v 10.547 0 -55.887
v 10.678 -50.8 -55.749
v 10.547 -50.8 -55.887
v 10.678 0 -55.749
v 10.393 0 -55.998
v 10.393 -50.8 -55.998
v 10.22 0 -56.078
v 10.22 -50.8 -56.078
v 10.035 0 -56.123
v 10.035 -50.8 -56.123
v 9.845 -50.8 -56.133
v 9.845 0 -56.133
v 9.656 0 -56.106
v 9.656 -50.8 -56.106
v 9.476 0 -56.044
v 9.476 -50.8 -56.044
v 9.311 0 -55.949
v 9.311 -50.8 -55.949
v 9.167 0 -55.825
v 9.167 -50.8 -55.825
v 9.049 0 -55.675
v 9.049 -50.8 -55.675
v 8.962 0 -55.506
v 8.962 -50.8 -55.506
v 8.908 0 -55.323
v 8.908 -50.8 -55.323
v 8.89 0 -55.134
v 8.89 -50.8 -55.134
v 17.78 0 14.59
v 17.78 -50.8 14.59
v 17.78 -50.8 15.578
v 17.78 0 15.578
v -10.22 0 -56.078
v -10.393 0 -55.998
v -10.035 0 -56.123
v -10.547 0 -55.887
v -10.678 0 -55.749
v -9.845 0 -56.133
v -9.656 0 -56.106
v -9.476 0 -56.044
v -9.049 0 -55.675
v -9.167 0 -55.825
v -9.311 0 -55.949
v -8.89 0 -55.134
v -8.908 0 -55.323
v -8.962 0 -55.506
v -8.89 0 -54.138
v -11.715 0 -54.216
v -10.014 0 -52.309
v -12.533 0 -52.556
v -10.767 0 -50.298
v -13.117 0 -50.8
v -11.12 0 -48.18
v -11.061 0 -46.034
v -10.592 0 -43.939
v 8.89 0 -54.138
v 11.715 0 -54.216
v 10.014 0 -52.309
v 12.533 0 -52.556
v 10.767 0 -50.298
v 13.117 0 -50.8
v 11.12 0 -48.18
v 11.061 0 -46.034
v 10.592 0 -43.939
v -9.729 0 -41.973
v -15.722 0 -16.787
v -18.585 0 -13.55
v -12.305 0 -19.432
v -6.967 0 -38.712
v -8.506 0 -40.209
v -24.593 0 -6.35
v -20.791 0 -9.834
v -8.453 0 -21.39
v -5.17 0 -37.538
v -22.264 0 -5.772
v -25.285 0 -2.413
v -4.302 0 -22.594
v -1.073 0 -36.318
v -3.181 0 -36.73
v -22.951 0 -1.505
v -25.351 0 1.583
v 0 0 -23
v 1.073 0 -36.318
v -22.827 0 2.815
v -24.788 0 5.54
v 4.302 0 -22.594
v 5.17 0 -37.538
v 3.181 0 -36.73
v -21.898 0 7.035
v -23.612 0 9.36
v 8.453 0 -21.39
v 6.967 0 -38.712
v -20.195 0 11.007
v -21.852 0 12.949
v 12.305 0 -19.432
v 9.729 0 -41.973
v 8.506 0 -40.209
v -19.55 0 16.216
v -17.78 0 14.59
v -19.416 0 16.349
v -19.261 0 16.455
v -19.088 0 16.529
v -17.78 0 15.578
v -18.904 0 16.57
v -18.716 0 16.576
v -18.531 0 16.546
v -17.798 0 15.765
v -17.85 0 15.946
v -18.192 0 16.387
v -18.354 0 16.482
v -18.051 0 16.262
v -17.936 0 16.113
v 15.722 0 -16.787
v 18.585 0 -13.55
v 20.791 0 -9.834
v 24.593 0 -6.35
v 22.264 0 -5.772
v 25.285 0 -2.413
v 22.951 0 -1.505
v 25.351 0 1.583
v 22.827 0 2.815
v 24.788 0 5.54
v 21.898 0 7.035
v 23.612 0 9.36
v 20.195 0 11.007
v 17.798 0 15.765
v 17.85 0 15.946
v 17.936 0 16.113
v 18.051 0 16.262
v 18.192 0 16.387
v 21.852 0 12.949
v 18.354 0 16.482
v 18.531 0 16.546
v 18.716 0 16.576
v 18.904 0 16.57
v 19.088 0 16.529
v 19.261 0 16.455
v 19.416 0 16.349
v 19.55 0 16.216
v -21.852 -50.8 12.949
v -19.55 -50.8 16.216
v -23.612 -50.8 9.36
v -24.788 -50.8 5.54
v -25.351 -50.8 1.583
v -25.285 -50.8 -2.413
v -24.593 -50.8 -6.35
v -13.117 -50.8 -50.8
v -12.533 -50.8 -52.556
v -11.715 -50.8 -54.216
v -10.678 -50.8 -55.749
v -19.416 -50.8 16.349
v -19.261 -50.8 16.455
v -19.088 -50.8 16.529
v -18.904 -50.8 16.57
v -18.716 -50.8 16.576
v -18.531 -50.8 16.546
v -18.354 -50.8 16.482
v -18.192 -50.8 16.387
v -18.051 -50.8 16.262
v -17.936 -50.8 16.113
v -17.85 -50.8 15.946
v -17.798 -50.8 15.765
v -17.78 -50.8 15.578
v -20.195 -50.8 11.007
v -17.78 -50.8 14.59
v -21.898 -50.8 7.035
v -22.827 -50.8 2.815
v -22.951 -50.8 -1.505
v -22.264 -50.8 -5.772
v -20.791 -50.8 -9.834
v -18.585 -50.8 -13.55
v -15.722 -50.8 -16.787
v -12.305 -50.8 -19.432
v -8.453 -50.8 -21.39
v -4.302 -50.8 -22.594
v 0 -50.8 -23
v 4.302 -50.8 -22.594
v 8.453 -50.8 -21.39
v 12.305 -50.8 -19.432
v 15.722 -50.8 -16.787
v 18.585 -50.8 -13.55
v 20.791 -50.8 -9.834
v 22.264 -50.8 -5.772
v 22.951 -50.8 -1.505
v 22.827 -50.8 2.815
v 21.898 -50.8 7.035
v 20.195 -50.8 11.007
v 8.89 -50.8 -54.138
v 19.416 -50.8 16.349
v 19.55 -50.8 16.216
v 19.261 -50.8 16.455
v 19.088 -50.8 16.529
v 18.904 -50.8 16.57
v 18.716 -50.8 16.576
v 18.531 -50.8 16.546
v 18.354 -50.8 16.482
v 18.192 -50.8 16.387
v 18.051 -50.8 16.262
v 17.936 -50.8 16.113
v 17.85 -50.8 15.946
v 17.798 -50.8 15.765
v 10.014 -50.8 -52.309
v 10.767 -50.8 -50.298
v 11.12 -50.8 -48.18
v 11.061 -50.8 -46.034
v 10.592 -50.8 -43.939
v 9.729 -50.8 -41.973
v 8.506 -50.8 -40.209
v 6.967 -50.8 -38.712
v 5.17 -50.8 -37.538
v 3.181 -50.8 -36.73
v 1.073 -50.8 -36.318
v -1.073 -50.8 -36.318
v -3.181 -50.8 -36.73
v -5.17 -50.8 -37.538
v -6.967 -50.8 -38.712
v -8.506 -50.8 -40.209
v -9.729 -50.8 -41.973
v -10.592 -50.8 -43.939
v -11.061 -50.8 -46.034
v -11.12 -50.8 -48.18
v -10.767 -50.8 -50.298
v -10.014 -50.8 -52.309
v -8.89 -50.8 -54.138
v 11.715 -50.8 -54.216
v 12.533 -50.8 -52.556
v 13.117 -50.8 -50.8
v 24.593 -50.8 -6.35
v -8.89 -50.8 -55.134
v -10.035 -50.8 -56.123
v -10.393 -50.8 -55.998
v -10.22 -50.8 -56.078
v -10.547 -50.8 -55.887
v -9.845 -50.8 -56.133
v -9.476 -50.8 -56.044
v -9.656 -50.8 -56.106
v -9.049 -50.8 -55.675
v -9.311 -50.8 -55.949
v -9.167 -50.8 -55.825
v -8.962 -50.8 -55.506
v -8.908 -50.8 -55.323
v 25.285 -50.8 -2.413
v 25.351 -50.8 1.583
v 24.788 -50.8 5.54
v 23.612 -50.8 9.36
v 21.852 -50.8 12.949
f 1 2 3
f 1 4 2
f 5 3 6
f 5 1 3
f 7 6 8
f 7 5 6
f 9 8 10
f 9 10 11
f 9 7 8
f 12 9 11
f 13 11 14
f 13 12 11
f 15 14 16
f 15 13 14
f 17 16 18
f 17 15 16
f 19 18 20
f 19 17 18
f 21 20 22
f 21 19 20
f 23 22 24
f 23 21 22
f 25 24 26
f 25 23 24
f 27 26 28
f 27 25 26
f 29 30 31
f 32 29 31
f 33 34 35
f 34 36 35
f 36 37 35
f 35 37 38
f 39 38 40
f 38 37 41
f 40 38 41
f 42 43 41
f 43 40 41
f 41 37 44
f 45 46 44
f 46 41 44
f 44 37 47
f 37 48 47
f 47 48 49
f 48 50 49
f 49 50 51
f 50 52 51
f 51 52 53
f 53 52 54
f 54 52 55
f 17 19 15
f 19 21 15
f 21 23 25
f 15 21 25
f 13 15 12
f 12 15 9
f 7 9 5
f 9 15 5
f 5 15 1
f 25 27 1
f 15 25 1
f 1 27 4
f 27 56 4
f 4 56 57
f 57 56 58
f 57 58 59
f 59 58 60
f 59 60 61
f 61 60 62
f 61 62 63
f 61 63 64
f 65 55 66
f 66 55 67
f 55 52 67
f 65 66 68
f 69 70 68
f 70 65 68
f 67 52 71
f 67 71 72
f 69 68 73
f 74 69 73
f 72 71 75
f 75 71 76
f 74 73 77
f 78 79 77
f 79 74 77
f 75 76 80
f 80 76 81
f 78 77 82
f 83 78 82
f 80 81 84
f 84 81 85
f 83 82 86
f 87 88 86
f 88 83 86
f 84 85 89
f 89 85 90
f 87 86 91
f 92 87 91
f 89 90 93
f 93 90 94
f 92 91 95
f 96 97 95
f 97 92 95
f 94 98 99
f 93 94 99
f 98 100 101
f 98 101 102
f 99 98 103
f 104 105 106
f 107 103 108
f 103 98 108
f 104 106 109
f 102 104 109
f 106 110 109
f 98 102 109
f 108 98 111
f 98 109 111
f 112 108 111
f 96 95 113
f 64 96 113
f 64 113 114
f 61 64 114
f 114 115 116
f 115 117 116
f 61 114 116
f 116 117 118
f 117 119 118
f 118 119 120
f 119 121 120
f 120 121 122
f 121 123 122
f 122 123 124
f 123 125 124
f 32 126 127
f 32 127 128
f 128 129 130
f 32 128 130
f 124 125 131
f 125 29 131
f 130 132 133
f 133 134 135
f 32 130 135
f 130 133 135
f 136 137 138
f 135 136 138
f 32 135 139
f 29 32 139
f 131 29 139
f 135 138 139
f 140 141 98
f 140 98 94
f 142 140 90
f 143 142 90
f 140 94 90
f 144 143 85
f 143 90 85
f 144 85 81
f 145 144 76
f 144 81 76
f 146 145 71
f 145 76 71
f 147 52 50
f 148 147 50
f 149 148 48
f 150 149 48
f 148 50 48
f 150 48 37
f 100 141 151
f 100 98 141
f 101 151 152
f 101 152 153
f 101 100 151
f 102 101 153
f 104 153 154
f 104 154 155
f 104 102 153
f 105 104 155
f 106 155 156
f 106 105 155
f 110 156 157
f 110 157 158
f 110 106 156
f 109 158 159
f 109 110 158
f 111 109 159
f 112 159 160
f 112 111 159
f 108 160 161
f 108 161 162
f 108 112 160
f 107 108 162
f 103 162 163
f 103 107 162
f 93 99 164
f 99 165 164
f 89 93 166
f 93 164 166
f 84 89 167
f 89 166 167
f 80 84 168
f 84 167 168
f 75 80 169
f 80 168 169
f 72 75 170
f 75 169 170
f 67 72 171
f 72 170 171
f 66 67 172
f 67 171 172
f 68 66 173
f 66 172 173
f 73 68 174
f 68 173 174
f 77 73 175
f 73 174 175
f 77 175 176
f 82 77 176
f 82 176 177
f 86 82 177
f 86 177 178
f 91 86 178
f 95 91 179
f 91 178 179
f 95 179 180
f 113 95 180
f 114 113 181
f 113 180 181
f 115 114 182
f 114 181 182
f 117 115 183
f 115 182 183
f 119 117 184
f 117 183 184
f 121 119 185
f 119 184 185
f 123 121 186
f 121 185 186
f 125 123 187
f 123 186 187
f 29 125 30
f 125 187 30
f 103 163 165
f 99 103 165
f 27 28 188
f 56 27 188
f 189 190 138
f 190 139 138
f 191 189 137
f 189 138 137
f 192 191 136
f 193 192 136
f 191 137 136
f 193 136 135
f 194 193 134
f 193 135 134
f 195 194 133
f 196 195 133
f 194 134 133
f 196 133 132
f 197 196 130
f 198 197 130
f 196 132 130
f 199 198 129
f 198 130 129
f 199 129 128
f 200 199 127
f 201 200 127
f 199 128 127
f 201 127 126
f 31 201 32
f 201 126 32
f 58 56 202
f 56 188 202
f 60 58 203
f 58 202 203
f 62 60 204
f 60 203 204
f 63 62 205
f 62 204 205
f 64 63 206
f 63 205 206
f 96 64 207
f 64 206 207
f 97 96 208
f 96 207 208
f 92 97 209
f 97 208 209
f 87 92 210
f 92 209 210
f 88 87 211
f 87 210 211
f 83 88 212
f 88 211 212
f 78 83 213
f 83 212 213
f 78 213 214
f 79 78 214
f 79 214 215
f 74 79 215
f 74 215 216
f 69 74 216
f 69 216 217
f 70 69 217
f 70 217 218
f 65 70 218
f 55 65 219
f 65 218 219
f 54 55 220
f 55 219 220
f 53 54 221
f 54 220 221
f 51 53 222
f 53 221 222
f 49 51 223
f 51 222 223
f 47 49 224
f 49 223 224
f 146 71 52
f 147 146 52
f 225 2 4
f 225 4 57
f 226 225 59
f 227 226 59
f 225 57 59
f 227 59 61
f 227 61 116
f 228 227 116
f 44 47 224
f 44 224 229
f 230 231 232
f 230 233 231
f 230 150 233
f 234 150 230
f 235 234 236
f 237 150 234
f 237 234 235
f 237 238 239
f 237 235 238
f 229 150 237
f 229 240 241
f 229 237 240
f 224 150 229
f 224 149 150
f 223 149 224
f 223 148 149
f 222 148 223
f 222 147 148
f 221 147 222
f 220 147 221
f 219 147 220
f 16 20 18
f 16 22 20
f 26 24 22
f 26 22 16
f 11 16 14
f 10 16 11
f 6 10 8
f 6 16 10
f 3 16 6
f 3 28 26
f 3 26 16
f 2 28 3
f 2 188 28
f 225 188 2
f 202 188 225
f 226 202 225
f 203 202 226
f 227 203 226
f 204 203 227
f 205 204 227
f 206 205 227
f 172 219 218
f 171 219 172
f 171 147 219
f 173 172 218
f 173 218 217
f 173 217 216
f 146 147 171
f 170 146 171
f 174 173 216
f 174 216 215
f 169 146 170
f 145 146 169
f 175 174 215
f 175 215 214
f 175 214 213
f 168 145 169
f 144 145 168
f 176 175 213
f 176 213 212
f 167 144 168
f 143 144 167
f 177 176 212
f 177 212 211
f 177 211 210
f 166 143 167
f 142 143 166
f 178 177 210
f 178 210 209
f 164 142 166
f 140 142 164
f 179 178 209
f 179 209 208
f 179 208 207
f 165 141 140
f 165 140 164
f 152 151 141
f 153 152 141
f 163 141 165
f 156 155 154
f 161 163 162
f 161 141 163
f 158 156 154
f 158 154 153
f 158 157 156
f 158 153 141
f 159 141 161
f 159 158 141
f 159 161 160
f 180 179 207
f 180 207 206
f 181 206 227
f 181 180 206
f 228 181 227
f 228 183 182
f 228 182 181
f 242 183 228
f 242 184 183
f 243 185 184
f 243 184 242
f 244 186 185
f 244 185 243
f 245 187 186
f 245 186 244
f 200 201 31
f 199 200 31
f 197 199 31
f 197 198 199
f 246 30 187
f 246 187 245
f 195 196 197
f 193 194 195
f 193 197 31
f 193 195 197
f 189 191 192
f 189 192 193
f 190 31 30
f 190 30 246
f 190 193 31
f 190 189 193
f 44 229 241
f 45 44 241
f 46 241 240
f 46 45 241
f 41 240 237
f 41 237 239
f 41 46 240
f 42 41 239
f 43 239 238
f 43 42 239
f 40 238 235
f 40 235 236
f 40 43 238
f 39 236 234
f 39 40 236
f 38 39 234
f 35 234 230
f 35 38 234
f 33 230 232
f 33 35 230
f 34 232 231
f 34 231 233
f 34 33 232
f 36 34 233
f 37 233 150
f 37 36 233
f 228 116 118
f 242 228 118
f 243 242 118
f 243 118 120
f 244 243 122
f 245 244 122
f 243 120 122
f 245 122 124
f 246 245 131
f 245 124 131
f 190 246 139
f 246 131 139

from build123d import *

# Parameters (mm, degrees)
F1_DEPTH = 50.8
F2_R     = 23
F2_R_2   = 11.1466666667
F3_DEPTH = 50.801
F5_DEPTH = 50.801
F6_R     = 1


with BuildPart() as f1:
    # F0 (on Front) → F1 (new body)
    with BuildSketch(Plane.XZ):
        with BuildLine():
            ThreePointArc((24.5934442484, -6.35), (0, 25.4), (-24.5934442484, -6.35))
            Line((-24.5934442484, -6.35), (-13.1165035992, -50.8))
            ThreePointArc((-13.1165035992, -50.8), (0, -60.96), (13.1165035992, -50.8))
            Line((13.1165035992, -50.8), (24.5934442484, -6.35))
        make_face()
    extrude(amount=F1_DEPTH)

    # F2 (on face) → F3 (cut, through all)
    with BuildSketch(Plane.XZ.offset(50.8)):
        Circle(F2_R)
        with Locations((0, -47.4133333333)):
            Circle(F2_R_2)
    extrude(amount=-F3_DEPTH, mode=Mode.SUBTRACT)

    # F4 (on face) → F5 (cut, through all)
    with BuildSketch(Plane.XZ.offset(50.8)):
        with BuildLine():
            ThreePointArc((-17.78, 14.5901199447), (0, 23), (17.78, 14.5901199447))
            Line((17.78, 14.5901199447), (17.78, 18.1392282085))
            ThreePointArc((17.78, 18.1392282085), (0, 25.4), (-17.78, 18.1392282085))
            Line((-17.78, 18.1392282085), (-17.78, 14.5901199447))
        make_face()
        with BuildLine():
            ThreePointArc((-8.89, -57.6348830093), (0, -60.96), (8.89, -57.6348830093))
            Line((8.89, -57.6348830093), (8.89, -54.1376234652))
            ThreePointArc((8.89, -54.1376234652), (0, -58.56), (-8.89, -54.1376234652))
            Line((-8.89, -54.1376234652), (-8.89, -57.6348830093))
        make_face()
    extrude(amount=-F5_DEPTH, mode=Mode.SUBTRACT)

    # F6
    f6_edges = [f1.edges().sort_by_distance(p)[0] for p in [
        (17.78, -25.4, 18.139228),
        (-17.78, -25.4, 18.139228),
        (8.89, -25.4, -57.634883),
        (-8.89, -25.4, -57.634883),
    ]]
    fillet(f6_edges, radius=F6_R)


solid = f1.part
